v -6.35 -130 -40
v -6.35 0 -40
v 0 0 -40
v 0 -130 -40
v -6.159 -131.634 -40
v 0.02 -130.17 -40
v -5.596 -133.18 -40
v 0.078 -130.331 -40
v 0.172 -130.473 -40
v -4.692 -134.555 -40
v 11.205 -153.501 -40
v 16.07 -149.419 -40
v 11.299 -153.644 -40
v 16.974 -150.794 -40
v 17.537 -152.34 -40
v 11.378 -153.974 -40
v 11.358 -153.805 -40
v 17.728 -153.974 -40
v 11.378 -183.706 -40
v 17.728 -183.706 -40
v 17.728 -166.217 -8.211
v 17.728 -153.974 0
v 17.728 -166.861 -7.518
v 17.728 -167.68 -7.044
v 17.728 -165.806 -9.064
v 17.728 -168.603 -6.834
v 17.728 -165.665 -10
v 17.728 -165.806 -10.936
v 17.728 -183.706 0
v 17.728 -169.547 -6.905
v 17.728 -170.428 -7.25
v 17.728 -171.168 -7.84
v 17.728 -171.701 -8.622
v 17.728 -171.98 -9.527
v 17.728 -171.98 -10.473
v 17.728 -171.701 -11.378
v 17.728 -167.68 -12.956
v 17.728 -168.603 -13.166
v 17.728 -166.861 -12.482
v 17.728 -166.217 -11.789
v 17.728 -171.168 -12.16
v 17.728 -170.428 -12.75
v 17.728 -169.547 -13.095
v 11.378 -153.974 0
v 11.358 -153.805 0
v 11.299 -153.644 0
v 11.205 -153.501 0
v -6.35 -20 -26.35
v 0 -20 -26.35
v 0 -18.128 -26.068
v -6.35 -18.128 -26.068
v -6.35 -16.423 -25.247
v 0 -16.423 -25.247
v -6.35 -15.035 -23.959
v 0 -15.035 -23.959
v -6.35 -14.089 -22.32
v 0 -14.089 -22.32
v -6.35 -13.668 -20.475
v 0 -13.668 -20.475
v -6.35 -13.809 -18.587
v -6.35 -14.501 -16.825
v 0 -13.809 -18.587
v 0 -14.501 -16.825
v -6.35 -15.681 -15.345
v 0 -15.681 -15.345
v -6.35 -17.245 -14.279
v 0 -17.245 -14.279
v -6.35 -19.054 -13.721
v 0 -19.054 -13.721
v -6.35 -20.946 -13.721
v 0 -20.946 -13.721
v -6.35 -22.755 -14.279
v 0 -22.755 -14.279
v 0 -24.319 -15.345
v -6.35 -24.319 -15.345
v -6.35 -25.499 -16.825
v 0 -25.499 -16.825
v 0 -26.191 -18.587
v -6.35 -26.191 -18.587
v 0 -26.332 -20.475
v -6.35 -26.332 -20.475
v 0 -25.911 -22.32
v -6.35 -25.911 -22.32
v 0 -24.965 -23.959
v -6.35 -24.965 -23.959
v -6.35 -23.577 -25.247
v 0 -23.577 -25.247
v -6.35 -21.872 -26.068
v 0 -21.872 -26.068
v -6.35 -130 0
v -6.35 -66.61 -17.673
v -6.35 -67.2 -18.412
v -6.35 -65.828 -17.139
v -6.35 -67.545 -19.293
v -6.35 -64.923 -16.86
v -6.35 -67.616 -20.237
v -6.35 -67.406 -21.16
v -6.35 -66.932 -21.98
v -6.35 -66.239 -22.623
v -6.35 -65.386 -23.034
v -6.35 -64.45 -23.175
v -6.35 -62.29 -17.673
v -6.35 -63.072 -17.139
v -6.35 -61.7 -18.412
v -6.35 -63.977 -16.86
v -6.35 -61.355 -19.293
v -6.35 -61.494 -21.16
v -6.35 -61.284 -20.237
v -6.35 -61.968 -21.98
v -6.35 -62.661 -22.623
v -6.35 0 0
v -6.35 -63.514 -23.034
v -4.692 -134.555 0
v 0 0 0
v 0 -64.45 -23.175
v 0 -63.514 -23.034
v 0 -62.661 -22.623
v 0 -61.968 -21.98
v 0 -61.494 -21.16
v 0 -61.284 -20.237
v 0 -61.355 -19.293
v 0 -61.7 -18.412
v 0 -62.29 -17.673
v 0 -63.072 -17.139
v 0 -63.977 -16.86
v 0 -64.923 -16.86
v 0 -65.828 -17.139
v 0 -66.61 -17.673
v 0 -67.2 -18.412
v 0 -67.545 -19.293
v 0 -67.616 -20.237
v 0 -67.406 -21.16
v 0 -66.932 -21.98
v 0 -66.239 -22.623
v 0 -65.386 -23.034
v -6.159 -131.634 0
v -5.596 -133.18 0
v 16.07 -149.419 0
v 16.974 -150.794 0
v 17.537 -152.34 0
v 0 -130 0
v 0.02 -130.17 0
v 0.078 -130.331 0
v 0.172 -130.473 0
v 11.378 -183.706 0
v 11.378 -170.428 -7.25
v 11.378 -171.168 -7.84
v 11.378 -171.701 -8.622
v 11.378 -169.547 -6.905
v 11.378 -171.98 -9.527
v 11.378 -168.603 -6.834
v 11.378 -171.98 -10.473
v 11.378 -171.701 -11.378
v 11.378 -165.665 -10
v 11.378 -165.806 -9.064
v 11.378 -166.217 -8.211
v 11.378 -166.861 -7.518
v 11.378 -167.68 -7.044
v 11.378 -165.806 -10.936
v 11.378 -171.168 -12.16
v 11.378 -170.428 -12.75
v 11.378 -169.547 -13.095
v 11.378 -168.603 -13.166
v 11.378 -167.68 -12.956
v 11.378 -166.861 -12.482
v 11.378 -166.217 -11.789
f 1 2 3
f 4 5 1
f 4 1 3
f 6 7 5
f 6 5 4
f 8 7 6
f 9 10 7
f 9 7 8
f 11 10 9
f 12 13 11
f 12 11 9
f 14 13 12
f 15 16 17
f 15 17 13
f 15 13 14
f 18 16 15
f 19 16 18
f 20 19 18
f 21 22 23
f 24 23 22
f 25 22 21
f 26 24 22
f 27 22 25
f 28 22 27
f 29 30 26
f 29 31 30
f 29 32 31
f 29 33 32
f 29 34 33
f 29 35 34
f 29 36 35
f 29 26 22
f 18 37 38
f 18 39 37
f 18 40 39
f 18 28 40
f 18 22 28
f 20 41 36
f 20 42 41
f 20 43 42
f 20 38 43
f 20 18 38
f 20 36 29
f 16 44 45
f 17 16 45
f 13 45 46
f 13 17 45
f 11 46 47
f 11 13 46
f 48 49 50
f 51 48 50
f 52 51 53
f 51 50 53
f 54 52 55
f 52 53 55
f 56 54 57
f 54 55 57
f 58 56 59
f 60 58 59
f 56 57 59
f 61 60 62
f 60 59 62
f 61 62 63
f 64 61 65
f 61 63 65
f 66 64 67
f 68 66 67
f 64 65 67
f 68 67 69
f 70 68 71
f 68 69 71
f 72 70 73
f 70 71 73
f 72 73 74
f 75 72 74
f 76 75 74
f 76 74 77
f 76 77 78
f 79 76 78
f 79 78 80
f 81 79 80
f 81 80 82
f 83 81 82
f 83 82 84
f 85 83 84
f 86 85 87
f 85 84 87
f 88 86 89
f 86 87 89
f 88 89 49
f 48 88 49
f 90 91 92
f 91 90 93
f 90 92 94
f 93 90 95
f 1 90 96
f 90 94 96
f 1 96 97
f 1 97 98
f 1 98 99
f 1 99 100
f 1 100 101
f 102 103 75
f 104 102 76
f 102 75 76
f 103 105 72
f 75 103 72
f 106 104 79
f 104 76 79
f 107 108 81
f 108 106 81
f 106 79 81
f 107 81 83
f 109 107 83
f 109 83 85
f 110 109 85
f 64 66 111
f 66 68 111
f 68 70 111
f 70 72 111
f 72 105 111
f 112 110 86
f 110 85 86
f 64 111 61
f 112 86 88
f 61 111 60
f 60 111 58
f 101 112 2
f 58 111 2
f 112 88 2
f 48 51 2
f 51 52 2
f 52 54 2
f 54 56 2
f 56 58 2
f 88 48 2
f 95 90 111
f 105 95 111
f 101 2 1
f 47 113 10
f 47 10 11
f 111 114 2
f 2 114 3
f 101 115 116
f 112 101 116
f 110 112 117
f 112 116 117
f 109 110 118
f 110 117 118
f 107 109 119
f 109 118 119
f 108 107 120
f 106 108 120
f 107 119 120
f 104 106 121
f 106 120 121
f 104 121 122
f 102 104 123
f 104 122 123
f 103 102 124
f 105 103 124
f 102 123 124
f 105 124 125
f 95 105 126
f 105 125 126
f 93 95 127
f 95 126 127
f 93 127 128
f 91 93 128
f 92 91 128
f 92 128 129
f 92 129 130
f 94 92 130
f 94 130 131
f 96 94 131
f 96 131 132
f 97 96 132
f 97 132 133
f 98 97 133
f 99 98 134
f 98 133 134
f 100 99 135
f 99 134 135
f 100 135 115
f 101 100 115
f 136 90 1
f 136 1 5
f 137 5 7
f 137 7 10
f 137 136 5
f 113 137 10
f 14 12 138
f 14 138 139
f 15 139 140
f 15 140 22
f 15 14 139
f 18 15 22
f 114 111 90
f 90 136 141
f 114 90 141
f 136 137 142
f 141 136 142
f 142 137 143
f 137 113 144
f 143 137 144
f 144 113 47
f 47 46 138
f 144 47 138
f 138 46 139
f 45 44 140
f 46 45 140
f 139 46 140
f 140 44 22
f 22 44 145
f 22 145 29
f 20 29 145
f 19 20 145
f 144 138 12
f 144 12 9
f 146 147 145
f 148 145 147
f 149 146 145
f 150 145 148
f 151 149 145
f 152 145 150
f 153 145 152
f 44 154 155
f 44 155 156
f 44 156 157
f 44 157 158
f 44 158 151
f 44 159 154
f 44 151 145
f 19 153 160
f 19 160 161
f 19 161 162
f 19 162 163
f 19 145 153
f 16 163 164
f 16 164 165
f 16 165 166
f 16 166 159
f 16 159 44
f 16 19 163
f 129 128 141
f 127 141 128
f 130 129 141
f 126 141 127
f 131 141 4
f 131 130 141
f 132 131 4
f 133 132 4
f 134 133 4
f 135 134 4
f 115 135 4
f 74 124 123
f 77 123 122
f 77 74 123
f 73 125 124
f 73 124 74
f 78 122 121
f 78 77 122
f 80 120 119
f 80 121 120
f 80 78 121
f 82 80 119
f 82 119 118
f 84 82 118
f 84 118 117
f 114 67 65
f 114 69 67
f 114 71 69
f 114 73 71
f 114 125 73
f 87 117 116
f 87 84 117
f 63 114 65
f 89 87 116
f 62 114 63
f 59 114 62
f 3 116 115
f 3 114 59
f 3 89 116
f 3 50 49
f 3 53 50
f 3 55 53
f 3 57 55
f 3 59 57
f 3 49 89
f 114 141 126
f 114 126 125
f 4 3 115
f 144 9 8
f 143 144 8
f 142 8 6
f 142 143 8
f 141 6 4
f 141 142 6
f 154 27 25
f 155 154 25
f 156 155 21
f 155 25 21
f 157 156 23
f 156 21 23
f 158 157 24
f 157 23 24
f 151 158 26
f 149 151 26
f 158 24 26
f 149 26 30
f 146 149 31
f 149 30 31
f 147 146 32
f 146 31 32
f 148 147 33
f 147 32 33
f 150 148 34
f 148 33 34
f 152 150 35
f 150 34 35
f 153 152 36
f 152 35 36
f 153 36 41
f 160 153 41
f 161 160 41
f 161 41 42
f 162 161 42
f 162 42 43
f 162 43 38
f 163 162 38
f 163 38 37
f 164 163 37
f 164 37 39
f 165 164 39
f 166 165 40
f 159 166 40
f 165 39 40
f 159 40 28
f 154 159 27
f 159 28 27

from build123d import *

# Parameters (mm, degrees)
SKETCH1_W          = 40
SKETCH1_H          = 130
SKETCH1_R          = 6.35
SKETCH1_R_2        = 3.175
BASE_FLANGE1_DEPTH = 6.35
EDGE_FLANGE1_DEPTH = 40
EDGE_FLANGE2_DEPTH = 40
SKETCH20_R         = 3.175
CUT_EXTRUDE3_DEPTH = 6.35


# Sheet-metal steps are written as plain solids
with BuildPart() as part:
    # Sketch1 → Base-Flange1 (new body)
    with BuildSketch(Plane(origin=(0, 0, 0), x_dir=(0, 0, -1), z_dir=(1, 0, 0))):
        with Locations((20, -65)):
            Rectangle(SKETCH1_W, SKETCH1_H)
        with Locations((20, -20)):
            Circle(SKETCH1_R, mode=Mode.SUBTRACT)
        with Locations((20, -64.45)):
            Circle(SKETCH1_R_2, mode=Mode.SUBTRACT)
    extrude(amount=-BASE_FLANGE1_DEPTH)

    # Edge-Flange1 section (across the edge) → Edge-Flange1 (add)
    with BuildSketch(Plane(origin=(0, -130.268100475, 0), x_dir=(0.7660444431189817, 0.642787609686535, 0), z_dir=(0, 0, -1))):
        with BuildLine():
            Line((-6.35, 0.268100475), (-6.35, 25))
            Line((-6.35, 25), (0, 25))
            Line((0, 25), (0, 0.268100475))
            ThreePointArc((0, 0.268100475), (0.044422416, 0.016168437), (0.172331663, -0.205376879))
            Line((0.172331663, -0.205376879), (-4.692050551, -4.2870782))
            ThreePointArc((-4.692050551, -4.2870782), (-5.922625726, -2.155659473), (-6.35, 0.268100475))
        make_face()
    extrude(amount=EDGE_FLANGE1_DEPTH)

    # Edge-Flange2 section (across the edge) → Edge-Flange2 (add)
    with BuildSketch(Plane(origin=(11.377639692, -153.706289753, -40), x_dir=(-1, 0, 0), z_dir=(0, 0, 1))):
        with BuildLine():
            Line((-6.35, 0.268100475), (-6.35, 30))
            Line((-6.35, 30), (0, 30))
            Line((0, 30), (0, 0.268100475))
            ThreePointArc((0, 0.268100475), (0.044422416, 0.016168437), (0.172331663, -0.205376879))
            Line((0.172331663, -0.205376879), (-4.692050551, -4.2870782))
            ThreePointArc((-4.692050551, -4.2870782), (-5.922625726, -2.155659473), (-6.35, 0.268100475))
        make_face()
    extrude(amount=EDGE_FLANGE2_DEPTH)

    # Sketch20 → Cut-Extrude3 (cut)
    with BuildSketch(Plane(origin=(17.727639692, 0, 0), x_dir=(0, 0, -1), z_dir=(1, 0, 0))):
        with Locations(Location((10, -168.84033999, 0), (0, 0, 90))):
            Circle(SKETCH20_R)
    extrude(amount=-CUT_EXTRUDE3_DEPTH, mode=Mode.SUBTRACT)


solid = part.part
